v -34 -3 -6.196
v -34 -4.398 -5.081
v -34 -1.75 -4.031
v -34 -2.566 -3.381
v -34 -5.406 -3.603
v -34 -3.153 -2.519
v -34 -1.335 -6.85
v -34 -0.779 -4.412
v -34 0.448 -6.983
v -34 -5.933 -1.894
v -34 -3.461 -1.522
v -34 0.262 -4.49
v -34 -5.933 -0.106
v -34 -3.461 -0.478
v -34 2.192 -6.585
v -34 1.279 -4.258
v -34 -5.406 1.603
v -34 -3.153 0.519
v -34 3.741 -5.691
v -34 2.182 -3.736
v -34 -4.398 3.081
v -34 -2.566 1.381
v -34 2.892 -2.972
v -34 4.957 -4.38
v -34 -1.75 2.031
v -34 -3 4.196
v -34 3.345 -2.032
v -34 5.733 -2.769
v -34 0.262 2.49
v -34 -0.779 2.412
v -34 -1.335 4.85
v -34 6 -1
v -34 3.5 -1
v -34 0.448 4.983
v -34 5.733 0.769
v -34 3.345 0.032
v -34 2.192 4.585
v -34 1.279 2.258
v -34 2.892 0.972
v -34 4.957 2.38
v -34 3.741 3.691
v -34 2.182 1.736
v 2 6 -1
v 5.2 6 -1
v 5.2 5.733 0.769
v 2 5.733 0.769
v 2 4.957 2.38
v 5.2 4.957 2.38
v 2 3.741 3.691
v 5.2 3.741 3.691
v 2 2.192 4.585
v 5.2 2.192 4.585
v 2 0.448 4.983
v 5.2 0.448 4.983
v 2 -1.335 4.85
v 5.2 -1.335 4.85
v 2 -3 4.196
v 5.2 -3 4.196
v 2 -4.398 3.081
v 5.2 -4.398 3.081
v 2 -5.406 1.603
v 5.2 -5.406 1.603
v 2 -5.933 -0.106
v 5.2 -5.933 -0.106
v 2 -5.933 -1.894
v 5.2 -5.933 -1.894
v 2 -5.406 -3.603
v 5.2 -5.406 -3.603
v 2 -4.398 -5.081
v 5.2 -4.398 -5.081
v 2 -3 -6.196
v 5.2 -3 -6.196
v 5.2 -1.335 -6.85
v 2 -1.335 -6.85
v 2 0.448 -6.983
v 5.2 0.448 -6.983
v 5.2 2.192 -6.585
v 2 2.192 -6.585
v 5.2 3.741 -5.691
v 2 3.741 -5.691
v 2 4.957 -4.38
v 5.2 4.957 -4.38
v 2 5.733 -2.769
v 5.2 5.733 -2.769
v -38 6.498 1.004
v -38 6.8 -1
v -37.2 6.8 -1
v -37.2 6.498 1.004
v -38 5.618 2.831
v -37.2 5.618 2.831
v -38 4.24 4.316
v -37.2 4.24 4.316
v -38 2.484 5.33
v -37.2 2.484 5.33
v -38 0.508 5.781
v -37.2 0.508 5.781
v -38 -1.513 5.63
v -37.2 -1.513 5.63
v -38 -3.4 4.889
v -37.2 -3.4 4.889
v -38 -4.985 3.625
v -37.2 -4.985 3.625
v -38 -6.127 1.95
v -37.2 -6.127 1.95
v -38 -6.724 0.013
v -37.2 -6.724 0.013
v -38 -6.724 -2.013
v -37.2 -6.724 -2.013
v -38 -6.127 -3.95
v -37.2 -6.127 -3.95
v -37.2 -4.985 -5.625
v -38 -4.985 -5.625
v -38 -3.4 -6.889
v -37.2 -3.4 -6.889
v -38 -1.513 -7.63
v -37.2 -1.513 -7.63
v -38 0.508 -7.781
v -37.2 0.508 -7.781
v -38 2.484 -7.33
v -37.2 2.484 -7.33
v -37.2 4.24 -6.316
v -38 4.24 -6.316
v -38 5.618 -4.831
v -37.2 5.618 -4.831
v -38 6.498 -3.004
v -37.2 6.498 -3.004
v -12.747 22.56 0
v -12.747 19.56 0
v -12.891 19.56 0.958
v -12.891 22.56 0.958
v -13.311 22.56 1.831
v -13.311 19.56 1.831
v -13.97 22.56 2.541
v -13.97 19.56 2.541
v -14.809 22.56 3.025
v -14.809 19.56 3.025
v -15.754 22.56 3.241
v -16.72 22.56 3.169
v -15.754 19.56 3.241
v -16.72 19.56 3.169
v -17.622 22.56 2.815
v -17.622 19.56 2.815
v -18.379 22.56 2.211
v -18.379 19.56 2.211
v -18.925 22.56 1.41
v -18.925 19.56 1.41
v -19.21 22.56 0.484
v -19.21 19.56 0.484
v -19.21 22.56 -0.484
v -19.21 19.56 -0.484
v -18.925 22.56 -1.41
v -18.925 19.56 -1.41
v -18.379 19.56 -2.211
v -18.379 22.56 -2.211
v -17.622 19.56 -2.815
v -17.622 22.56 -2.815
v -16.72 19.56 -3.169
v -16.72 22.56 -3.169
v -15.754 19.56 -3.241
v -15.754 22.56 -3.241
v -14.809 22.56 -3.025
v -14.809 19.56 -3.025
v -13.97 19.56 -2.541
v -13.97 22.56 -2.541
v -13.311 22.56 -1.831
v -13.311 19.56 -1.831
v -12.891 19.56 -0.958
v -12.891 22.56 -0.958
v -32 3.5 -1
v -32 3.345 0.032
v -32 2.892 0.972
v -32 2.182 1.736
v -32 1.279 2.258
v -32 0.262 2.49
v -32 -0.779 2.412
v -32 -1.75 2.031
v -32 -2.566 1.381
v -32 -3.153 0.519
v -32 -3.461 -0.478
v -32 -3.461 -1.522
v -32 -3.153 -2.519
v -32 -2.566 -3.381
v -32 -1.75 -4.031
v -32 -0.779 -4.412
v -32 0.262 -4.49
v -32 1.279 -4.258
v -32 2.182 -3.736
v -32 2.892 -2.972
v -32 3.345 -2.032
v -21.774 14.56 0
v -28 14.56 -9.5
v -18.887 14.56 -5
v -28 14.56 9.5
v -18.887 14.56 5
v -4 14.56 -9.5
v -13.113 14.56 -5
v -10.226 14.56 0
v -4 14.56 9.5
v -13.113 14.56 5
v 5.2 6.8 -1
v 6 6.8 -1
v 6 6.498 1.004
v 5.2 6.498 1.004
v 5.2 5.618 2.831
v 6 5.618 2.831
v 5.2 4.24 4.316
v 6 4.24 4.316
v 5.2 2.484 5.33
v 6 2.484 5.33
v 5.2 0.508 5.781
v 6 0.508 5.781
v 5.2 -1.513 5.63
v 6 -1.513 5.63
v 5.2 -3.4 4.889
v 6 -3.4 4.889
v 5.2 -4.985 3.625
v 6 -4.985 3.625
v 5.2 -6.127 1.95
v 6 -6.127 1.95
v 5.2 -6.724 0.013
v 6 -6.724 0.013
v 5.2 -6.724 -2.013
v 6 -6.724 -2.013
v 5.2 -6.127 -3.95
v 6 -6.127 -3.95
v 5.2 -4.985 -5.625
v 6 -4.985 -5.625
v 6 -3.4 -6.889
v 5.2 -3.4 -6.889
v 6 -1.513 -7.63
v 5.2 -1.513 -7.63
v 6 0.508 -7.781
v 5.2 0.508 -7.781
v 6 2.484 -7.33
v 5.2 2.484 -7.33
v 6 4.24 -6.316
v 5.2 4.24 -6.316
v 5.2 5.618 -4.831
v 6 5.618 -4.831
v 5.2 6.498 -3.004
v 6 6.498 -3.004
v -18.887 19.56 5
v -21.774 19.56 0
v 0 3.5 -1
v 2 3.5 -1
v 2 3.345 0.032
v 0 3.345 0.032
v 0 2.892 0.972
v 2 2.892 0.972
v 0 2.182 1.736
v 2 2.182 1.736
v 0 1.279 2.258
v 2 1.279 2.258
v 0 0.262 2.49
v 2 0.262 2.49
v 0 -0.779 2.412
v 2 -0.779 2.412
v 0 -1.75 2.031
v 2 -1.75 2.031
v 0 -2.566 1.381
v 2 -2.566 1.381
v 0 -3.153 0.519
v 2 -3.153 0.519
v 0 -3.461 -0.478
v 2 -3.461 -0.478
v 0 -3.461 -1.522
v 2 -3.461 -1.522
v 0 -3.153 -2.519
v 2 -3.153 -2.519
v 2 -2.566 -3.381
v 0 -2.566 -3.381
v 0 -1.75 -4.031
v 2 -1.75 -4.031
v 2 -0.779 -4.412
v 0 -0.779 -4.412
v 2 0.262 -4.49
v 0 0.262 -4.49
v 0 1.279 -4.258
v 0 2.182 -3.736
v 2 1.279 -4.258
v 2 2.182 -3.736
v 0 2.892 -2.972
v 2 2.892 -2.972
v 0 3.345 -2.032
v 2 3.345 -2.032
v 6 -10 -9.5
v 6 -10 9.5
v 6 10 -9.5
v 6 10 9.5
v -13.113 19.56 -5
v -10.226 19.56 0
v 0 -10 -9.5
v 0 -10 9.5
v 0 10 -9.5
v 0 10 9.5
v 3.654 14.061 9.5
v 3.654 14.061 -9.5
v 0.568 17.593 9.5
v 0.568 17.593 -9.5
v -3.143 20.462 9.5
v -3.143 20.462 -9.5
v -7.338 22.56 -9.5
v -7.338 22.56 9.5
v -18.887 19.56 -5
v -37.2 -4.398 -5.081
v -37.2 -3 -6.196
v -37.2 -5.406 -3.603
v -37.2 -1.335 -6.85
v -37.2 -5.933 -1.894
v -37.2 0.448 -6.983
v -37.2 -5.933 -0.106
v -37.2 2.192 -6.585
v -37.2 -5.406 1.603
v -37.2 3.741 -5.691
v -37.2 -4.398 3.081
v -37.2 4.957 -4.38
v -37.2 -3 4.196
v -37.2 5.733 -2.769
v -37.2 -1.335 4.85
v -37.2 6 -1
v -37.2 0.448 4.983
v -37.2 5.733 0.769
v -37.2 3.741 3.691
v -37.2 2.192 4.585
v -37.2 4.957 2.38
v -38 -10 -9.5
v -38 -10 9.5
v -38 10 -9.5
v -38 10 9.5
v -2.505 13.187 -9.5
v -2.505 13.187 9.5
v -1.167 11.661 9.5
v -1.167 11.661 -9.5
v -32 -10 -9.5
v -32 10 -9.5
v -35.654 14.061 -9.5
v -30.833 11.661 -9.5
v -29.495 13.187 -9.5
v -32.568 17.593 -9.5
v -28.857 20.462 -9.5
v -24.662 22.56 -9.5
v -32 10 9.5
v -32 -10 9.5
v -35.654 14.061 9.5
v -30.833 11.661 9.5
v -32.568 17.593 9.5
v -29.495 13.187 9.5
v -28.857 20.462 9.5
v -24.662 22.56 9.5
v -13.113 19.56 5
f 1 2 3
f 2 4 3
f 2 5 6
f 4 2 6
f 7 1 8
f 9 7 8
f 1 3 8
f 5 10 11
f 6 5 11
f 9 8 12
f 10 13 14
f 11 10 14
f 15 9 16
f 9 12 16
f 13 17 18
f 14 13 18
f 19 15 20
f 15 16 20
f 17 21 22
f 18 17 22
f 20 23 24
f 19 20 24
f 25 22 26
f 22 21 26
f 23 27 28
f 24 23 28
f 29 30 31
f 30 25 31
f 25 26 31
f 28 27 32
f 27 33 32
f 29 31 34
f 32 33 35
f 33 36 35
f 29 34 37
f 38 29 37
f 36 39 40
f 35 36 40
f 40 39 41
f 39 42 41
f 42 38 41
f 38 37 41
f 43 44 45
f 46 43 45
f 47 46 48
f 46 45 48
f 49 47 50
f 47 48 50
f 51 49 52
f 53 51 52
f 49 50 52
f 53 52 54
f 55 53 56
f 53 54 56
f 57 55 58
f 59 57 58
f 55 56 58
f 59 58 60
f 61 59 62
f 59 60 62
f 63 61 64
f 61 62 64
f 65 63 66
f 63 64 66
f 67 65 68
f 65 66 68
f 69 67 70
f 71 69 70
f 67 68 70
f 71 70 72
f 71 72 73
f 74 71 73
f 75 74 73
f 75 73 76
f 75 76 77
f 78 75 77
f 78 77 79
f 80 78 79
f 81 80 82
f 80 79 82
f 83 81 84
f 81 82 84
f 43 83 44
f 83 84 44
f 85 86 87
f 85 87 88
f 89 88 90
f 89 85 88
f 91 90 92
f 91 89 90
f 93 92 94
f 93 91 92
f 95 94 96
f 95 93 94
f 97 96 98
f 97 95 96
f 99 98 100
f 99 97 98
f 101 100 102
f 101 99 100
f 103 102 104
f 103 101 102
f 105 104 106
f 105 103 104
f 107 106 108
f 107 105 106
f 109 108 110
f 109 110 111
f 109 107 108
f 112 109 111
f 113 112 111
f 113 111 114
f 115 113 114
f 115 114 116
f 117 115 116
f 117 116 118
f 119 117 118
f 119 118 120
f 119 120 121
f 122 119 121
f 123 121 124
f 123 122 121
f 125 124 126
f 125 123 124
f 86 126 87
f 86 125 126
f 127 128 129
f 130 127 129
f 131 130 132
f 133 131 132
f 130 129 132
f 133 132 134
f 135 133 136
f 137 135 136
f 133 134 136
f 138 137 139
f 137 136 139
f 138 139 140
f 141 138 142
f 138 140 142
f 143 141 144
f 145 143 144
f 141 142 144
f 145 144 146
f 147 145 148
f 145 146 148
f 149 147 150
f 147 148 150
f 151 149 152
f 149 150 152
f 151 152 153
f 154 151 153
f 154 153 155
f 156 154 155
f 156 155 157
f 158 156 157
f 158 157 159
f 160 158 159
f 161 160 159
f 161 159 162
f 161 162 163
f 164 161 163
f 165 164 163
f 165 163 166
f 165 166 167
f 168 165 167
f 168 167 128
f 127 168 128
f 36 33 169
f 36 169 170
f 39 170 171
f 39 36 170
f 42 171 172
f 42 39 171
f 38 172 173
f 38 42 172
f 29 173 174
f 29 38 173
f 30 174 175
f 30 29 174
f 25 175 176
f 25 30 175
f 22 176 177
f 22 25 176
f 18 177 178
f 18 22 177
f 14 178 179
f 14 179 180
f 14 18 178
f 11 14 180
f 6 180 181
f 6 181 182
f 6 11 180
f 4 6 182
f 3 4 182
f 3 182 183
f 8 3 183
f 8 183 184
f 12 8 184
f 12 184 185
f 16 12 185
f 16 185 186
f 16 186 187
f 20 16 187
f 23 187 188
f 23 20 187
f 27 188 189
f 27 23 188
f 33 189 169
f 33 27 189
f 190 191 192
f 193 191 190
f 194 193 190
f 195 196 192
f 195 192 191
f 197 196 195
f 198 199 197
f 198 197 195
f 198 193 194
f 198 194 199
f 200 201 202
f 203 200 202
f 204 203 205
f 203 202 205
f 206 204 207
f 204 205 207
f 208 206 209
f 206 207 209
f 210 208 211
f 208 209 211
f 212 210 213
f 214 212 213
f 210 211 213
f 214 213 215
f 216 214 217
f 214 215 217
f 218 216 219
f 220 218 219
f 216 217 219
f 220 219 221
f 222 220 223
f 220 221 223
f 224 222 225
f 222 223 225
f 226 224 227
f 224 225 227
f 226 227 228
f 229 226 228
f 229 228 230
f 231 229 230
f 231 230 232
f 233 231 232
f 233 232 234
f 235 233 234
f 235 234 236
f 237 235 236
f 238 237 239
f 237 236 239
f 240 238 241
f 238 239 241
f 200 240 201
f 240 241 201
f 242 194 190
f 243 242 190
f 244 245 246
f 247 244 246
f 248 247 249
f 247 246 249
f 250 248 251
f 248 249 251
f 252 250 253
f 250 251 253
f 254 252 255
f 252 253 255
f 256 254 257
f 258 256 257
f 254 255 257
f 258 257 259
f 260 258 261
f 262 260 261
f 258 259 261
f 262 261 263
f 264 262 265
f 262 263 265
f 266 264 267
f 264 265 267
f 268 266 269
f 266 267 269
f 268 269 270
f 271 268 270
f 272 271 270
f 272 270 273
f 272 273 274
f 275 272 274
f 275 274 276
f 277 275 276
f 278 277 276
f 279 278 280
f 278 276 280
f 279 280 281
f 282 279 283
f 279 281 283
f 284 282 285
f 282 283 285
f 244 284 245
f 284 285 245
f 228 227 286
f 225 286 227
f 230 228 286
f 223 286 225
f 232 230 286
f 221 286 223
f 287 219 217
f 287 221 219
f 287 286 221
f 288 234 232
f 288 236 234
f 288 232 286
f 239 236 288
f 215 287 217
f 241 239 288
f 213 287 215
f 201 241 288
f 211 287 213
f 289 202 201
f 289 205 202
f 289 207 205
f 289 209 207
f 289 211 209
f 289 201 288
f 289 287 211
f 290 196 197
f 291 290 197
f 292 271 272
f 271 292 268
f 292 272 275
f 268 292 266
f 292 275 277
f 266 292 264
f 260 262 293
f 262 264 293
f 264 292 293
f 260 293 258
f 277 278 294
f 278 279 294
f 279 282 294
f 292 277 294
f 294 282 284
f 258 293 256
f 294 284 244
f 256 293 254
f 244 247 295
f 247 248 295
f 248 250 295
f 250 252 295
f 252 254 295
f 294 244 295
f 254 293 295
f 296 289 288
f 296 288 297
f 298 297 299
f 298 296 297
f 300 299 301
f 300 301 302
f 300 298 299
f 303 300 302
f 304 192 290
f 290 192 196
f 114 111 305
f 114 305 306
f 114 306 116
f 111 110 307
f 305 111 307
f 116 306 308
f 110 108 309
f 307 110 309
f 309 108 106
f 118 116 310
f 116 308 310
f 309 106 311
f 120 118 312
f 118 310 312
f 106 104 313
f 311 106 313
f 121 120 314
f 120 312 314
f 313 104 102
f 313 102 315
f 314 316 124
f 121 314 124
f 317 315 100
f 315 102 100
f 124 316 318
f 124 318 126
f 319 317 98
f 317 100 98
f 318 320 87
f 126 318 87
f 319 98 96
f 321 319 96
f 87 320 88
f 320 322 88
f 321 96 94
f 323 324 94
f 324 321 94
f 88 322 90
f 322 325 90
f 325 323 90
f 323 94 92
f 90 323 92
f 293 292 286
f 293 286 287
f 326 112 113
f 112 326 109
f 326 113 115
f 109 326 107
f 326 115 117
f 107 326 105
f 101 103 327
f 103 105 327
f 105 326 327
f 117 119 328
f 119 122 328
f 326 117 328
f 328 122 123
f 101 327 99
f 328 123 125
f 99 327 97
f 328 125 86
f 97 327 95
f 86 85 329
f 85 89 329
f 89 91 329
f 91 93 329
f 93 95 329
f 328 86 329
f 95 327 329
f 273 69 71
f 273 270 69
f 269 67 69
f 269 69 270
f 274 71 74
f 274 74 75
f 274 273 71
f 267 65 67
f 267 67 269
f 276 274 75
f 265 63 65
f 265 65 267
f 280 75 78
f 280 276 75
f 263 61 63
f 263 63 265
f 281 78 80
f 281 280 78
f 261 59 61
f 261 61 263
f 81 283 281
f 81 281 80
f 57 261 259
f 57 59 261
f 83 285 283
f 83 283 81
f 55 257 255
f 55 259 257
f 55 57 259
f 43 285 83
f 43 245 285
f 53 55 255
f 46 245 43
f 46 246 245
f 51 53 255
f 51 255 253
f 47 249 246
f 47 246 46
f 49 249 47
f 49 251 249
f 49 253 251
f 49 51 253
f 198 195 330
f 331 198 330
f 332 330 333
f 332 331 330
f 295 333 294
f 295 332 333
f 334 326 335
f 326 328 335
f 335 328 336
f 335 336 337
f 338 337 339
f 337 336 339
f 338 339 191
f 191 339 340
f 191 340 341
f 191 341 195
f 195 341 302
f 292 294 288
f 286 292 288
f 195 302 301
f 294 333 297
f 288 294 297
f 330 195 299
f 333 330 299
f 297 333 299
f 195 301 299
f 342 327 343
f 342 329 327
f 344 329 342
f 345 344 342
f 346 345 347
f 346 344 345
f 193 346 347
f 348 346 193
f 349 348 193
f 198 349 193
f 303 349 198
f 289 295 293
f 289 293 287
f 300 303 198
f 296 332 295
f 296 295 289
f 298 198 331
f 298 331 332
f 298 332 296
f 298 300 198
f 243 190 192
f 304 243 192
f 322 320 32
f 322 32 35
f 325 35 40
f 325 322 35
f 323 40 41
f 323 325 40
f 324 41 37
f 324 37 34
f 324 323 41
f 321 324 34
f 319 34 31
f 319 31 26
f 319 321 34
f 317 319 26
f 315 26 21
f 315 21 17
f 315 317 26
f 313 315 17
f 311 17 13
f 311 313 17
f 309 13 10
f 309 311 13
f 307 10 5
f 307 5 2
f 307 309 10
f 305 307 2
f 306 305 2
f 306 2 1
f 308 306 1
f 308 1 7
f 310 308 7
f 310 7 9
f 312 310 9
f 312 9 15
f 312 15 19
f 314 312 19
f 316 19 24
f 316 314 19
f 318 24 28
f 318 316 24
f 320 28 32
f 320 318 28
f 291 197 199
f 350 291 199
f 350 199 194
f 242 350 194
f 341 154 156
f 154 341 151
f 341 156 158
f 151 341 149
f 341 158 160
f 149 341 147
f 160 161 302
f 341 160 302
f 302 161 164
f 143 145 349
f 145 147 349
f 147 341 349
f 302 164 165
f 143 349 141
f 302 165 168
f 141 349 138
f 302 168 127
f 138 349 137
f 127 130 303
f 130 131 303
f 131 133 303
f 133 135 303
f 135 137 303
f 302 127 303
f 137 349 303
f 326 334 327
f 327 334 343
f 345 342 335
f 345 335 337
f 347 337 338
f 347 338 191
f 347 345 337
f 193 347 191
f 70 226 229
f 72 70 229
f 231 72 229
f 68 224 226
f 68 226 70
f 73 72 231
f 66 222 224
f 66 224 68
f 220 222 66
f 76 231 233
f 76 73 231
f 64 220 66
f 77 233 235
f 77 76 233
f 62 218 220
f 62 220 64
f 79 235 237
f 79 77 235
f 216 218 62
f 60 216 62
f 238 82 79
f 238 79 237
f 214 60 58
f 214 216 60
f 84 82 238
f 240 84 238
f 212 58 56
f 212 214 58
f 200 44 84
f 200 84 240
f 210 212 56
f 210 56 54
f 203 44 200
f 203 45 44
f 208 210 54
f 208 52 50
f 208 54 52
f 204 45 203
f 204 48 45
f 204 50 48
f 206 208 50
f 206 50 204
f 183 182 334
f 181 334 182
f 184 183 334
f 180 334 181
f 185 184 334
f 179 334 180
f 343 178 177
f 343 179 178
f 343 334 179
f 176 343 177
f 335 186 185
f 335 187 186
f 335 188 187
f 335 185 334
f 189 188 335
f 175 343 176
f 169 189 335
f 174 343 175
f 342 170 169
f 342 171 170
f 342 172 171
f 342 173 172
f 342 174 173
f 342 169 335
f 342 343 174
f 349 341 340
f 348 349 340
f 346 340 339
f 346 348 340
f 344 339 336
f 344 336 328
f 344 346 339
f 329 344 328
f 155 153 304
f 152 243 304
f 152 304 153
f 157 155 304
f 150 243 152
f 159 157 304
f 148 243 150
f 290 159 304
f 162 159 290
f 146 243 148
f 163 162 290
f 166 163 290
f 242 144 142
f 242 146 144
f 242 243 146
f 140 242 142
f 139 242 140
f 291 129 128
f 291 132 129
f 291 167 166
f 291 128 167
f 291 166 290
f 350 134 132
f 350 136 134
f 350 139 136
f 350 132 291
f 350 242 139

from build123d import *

# Parameters (mm, degrees)
F0_W      = 20
F0_H      = 19
F1_DEPTH  = 6
F2_R      = 6.8
F3_DEPTH  = 0.8
F4_R      = 6
F5_DEPTH  = 3.2
F6_R      = 3.5
F7_DEPTH  = 2
F11_DEPTH = 9.5
F12_W     = 24
F12_H     = 5
F13_DEPTH = 9.5
F15_DEPTH = 5
F16_R     = 3.25
F17_DEPTH = 25
F18_W     = 26
F18_H     = 5
F19_DEPTH = 12.5


with BuildPart() as f1:
    # F0 (on Right) → F1 (new body)
    with BuildSketch(Plane.YZ):
        Rectangle(F0_W, F0_H)
    extrude(amount=F1_DEPTH)

    # F2 (on face) → F3 (cut)
    with BuildSketch(Plane.YZ.offset(6)):
        with Locations((0, -1)):
            Circle(F2_R)
    extrude(amount=-F3_DEPTH, mode=Mode.SUBTRACT)

    # F4 (on face) → F5 (cut)
    with BuildSketch(Plane.YZ.offset(5.2)):
        with Locations((0, -1)):
            Circle(F4_R)
    extrude(amount=-F5_DEPTH, mode=Mode.SUBTRACT)

    # F6 (on face) → F7 (cut, through all)
    with BuildSketch(Plane.YZ.offset(2)):
        with Locations((0, -1)):
            Circle(F6_R)
    extrude(amount=-F7_DEPTH, mode=Mode.SUBTRACT)


with BuildPart() as f9_1:
    # F9: instance of F1
    add(f1.part.mirror(Plane.YZ.offset(-16)))


with BuildPart() as f1_1:
    add(f1.part)

    add(f9_1.part)  # F11 merges F9_1
    # F10 (on Top) → F11 (join, symmetric)
    with BuildSketch(Plane.XY):
        with BuildLine():
            ThreePointArc((-32, 10), (-16, 18.8679622641), (0, 10))
            Line((0, 10), (6, 10))
            ThreePointArc((6, 10), (-16, 24.1660919472), (-38, 10))
            Line((-38, 10), (-32, 10))
        make_face()
    extrude(amount=F11_DEPTH, both=True)

    # F12 (on Top) → F13 (join, symmetric)
    with BuildSketch(Plane.XY):
        with Locations((-16, 17.0602197786)):
            Rectangle(F12_W, F12_H)
    extrude(amount=F13_DEPTH, both=True)

    # F14 (on face) → F15 (cut)
    with BuildSketch(Plane.XZ.offset(-14.5602197786)):
        Polygon((-18.8867513459, -5), (-13.1132486541, -5), (-10.2264973081, 0), (-13.1132486541, 5), (-18.8867513459, 5), (-21.7735026919, 0), align=None)
    extrude(amount=-F15_DEPTH, mode=Mode.SUBTRACT)

    # F16 (on face) → F17 (cut)
    with BuildSketch(Plane.XZ.offset(-19.5602197786)):
        with Locations((-15.9966088831, 0)):
            Circle(F16_R)
    extrude(amount=-F17_DEPTH, mode=Mode.SUBTRACT)

    # F18 (on Top) → F19 (cut, symmetric)
    with BuildSketch(Plane.XY):
        with Locations((-16, 25.0602197786)):
            Rectangle(F18_W, F18_H)
    extrude(amount=F19_DEPTH, both=True, mode=Mode.SUBTRACT)


solid = f1_1.part
